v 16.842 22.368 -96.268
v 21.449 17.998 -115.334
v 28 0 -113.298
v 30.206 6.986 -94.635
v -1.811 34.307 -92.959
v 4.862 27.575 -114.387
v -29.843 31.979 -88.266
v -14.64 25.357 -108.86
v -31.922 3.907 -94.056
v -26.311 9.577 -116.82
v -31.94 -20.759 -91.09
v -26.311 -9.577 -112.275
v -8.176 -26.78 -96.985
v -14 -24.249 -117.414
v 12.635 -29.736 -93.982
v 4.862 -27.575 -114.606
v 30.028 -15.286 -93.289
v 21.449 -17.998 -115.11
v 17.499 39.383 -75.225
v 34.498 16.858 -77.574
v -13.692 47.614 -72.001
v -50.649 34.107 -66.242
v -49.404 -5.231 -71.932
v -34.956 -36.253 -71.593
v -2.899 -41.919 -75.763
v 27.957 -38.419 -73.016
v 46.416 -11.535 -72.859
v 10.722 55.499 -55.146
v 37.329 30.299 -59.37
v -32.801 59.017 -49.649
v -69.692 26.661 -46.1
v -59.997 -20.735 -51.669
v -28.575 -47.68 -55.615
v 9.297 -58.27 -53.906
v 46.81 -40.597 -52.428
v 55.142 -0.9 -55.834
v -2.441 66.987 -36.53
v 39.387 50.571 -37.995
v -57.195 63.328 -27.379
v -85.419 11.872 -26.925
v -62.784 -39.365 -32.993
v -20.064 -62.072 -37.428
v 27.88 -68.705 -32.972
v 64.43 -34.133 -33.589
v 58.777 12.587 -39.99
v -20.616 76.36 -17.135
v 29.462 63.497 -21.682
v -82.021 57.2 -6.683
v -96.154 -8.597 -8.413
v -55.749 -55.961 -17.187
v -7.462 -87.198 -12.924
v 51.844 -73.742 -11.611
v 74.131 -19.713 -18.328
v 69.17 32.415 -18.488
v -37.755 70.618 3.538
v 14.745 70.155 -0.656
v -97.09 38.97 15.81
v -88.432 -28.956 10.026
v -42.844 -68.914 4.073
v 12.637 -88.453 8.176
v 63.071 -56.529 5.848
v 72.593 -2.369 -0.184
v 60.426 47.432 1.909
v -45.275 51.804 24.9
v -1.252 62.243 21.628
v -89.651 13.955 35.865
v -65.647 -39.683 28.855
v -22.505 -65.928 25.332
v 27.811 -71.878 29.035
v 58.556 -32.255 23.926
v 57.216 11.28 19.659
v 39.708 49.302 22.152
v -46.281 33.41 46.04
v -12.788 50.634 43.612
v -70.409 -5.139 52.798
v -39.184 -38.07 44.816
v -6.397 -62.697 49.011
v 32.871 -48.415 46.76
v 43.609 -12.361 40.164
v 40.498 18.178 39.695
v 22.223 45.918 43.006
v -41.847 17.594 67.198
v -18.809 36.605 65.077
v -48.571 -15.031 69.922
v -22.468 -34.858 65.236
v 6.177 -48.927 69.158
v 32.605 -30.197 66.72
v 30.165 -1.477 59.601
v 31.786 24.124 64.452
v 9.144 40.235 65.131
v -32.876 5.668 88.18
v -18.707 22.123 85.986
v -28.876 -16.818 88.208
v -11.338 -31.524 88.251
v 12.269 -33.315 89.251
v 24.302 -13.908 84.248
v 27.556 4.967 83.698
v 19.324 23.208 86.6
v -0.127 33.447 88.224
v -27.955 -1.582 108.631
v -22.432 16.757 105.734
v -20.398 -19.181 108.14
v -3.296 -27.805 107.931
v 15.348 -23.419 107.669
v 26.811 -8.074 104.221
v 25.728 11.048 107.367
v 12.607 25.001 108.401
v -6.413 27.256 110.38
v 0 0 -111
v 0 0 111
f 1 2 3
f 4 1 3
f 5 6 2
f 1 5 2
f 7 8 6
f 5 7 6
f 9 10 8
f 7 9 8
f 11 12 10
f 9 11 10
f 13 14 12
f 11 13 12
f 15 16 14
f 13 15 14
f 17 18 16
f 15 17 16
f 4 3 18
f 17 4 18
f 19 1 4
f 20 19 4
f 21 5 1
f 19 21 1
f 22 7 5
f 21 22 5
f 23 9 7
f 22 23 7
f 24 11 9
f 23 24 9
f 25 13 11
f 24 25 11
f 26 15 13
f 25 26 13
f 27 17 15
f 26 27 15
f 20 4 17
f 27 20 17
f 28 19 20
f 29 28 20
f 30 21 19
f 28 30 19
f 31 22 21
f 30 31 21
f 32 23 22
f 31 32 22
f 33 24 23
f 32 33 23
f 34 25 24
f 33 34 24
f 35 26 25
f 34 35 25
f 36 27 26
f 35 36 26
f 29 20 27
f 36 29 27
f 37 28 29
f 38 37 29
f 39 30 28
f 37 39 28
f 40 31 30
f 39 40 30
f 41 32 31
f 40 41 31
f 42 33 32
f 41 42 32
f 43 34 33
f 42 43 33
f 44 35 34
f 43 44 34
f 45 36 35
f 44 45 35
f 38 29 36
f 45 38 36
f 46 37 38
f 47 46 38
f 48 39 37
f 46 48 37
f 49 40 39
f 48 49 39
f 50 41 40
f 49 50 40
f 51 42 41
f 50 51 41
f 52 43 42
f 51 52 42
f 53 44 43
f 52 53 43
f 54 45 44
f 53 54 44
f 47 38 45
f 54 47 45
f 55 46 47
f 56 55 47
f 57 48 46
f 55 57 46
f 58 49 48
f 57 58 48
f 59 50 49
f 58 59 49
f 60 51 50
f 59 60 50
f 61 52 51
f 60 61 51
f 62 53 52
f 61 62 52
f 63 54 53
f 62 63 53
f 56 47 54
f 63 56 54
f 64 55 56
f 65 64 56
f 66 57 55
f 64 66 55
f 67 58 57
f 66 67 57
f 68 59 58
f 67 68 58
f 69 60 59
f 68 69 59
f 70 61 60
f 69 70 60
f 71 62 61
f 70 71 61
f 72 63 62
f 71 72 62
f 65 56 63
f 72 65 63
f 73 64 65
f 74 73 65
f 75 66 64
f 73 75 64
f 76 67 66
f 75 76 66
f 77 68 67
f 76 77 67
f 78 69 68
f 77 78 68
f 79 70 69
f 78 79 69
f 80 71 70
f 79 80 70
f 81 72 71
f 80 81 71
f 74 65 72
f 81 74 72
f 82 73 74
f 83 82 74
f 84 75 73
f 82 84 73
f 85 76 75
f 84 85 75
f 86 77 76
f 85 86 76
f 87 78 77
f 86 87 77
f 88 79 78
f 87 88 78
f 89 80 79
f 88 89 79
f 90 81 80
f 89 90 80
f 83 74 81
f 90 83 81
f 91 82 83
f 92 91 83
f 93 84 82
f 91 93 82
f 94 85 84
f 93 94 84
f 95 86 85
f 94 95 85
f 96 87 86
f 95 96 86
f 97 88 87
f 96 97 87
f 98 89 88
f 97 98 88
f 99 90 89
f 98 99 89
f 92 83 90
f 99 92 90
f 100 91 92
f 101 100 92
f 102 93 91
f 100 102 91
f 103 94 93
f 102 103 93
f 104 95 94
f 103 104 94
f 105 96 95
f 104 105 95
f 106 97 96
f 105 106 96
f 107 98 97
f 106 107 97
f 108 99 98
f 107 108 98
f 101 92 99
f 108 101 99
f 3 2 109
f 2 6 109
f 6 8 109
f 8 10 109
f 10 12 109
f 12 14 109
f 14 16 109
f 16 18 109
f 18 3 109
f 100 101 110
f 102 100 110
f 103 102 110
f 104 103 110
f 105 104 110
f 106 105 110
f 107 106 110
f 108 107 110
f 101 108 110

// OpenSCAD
module object1(scale) {polyhedron(
 points=[[28,0,-113.29807126778162],[21.449244407331385,17.998053071223097,-115.33448118412322],[16.842323638503295,22.368194707126307,-96.26775887044725],
[28,0,-113.29807126778162],[16.842323638503295,22.368194707126307,-96.26775887044725],[30.205709612306514,6.985626156597965,-94.63488091709826],
[21.449244407331385,17.998053071223097,-115.33448118412322],[4.862148974674051,27.574617084341824,-114.38710898759963],[-1.8110481182452045,34.307460404387896,-92.95874931797498],
[21.449244407331385,17.998053071223097,-115.33448118412322],[-1.8110481182452045,34.307460404387896,-92.95874931797498],[16.842323638503295,22.368194707126307,-96.26775887044725],
[4.862148974674051,27.574617084341824,-114.38710898759963],[-14.63976195944456,25.356811524472093,-108.86023804055543],[-29.843335256421017,31.97869198412332,-88.2659418283453],
[4.862148974674051,27.574617084341824,-114.38710898759963],[-29.843335256421017,31.97869198412332,-88.2659418283453],[-1.8110481182452045,34.307460404387896,-92.95874931797498],
[-14.63976195944456,25.356811524472093,-108.86023804055543],[-26.311393382005434,9.576564013118729,-116.82011558374396],[-31.92175213137996,3.907188196070144,-94.05637313001716],
[-14.63976195944456,25.356811524472093,-108.86023804055543],[-31.92175213137996,3.907188196070144,-94.05637313001716],[-29.843335256421017,31.97869198412332,-88.2659418283453],
[-26.311393382005434,9.576564013118729,-116.82011558374396],[-26.311393382005434,-9.576564013118723,-112.2748494113802],[-31.93951699779394,-20.759021255166886,-91.08990917939948],
[-26.311393382005434,9.576564013118729,-116.82011558374396],[-31.93951699779394,-20.759021255166886,-91.08990917939948],[-31.92175213137996,3.907188196070144,-94.05637313001716],
[-26.311393382005434,-9.576564013118723,-112.2748494113802],[-14.000000000000012,-24.248711305964274,-117.41365111449593],[-8.176234080321816,-26.779641451367194,-96.98470474322335],
[-26.311393382005434,-9.576564013118723,-112.2748494113802],[-8.176234080321816,-26.779641451367194,-96.98470474322335],[-31.93951699779394,-20.759021255166886,-91.08990917939948],
[-14.000000000000012,-24.248711305964274,-117.41365111449593],[4.862148974674039,-27.574617084341828,-114.60568491477093],[12.635435192538141,-29.735804463732677,-93.98185737951555],
[-14.000000000000012,-24.248711305964274,-117.41365111449593],[12.635435192538141,-29.735804463732677,-93.98185737951555],[-8.176234080321816,-26.779641451367194,-96.98470474322335],
[4.862148974674039,-27.574617084341828,-114.60568491477093],[21.449244407331378,-17.998053071223108,-115.10959001370429],[30.027776818176164,-15.285549196324304,-93.28914283532757],
[4.862148974674039,-27.574617084341828,-114.60568491477093],[30.027776818176164,-15.285549196324304,-93.28914283532757],[12.635435192538141,-29.735804463732677,-93.98185737951555],
[21.449244407331378,-17.998053071223108,-115.10959001370429],[28,0,-113.29807126778162],[30.205709612306514,6.985626156597965,-94.63488091709826],
[21.449244407331378,-17.998053071223108,-115.10959001370429],[30.205709612306514,6.985626156597965,-94.63488091709826],[30.027776818176164,-15.285549196324304,-93.28914283532757],
[30.205709612306514,6.985626156597965,-94.63488091709826],[16.842323638503295,22.368194707126307,-96.26775887044725],[17.49853483256472,39.38286169945253,-75.2250561867103],
[30.205709612306514,6.985626156597965,-94.63488091709826],[17.49853483256472,39.38286169945253,-75.2250561867103],[34.49782843915703,16.85817600499015,-77.57443135074021],
[16.842323638503295,22.368194707126307,-96.26775887044725],[-1.8110481182452045,34.307460404387896,-92.95874931797498],[-13.692161381876396,47.61366551315927,-72.00108811165055],
[16.842323638503295,22.368194707126307,-96.26775887044725],[-13.692161381876396,47.61366551315927,-72.00108811165055],[17.49853483256472,39.38286169945253,-75.2250561867103],
[-1.8110481182452045,34.307460404387896,-92.95874931797498],[-29.843335256421017,31.97869198412332,-88.2659418283453],[-50.648792736040654,34.107075904793966,-66.24162496543339],
[-1.8110481182452045,34.307460404387896,-92.95874931797498],[-50.648792736040654,34.107075904793966,-66.24162496543339],[-13.692161381876396,47.61366551315927,-72.00108811165055],
[-29.843335256421017,31.97869198412332,-88.2659418283453],[-31.92175213137996,3.907188196070144,-94.05637313001716],[-49.40443342320193,-5.230572842721768,-71.9324528472574],
[-29.843335256421017,31.97869198412332,-88.2659418283453],[-49.40443342320193,-5.230572842721768,-71.9324528472574],[-50.648792736040654,34.107075904793966,-66.24162496543339],
[-31.92175213137996,3.907188196070144,-94.05637313001716],[-31.93951699779394,-20.759021255166886,-91.08990917939948],[-34.95576185722093,-36.252837582695264,-71.59250924440181],
[-31.92175213137996,3.907188196070144,-94.05637313001716],[-34.95576185722093,-36.252837582695264,-71.59250924440181],[-49.40443342320193,-5.230572842721768,-71.9324528472574],
[-31.93951699779394,-20.759021255166886,-91.08990917939948],[-8.176234080321816,-26.779641451367194,-96.98470474322335],[-2.899271068370793,-41.91921983584189,-75.76304638287596],
[-31.93951699779394,-20.759021255166886,-91.08990917939948],[-2.899271068370793,-41.91921983584189,-75.76304638287596],[-34.95576185722093,-36.252837582695264,-71.59250924440181],
[-8.176234080321816,-26.779641451367194,-96.98470474322335],[12.635435192538141,-29.735804463732677,-93.98185737951555],[27.957493955642914,-38.41876575922486,-73.01550189421347],
[-8.176234080321816,-26.779641451367194,-96.98470474322335],[27.957493955642914,-38.41876575922486,-73.01550189421347],[-2.899271068370793,-41.91921983584189,-75.76304638287596],
[12.635435192538141,-29.735804463732677,-93.98185737951555],[30.027776818176164,-15.285549196324304,-93.28914283532757],[46.416468117173125,-11.53547036556529,-72.85852861885542],
[12.635435192538141,-29.735804463732677,-93.98185737951555],[46.416468117173125,-11.53547036556529,-72.85852861885542],[27.957493955642914,-38.41876575922486,-73.01550189421347],
[30.027776818176164,-15.285549196324304,-93.28914283532757],[30.205709612306514,6.985626156597965,-94.63488091709826],[34.49782843915703,16.85817600499015,-77.57443135074021],
[30.027776818176164,-15.285549196324304,-93.28914283532757],[34.49782843915703,16.85817600499015,-77.57443135074021],[46.416468117173125,-11.53547036556529,-72.85852861885542],
[34.49782843915703,16.85817600499015,-77.57443135074021],[17.49853483256472,39.38286169945253,-75.2250561867103],[10.722265180623465,55.49891842691174,-55.14649673781652],
[34.49782843915703,16.85817600499015,-77.57443135074021],[10.722265180623465,55.49891842691174,-55.14649673781652],[37.328617428965615,30.2986293146558,-59.37041052983031],
[17.49853483256472,39.38286169945253,-75.2250561867103],[-13.692161381876396,47.61366551315927,-72.00108811165055],[-32.80149414834799,59.01672500603995,-49.64923364931177],
[17.49853483256472,39.38286169945253,-75.2250561867103],[-32.80149414834799,59.01672500603995,-49.64923364931177],[10.722265180623465,55.49891842691174,-55.14649673781652],
[-13.692161381876396,47.61366551315927,-72.00108811165055],[-50.648792736040654,34.107075904793966,-66.24162496543339],[-69.69241515290658,26.66131327541818,-46.10004925892564],
[-13.692161381876396,47.61366551315927,-72.00108811165055],[-69.69241515290658,26.66131327541818,-46.10004925892564],[-32.80149414834799,59.01672500603995,-49.64923364931177],
[-50.648792736040654,34.107075904793966,-66.24162496543339],[-49.40443342320193,-5.230572842721768,-71.9324528472574],[-59.997386768556936,-20.735278130707076,-51.66937533769051],
[-50.648792736040654,34.107075904793966,-66.24162496543339],[-59.997386768556936,-20.735278130707076,-51.66937533769051],[-69.69241515290658,26.66131327541818,-46.10004925892564],
[-49.40443342320193,-5.230572842721768,-71.9324528472574],[-34.95576185722093,-36.252837582695264,-71.59250924440181],[-28.575369504268686,-47.680415732384056,-55.61532458137606],
[-49.40443342320193,-5.230572842721768,-71.9324528472574],[-28.575369504268686,-47.680415732384056,-55.61532458137606],[-59.997386768556936,-20.735278130707076,-51.66937533769051],
[-34.95576185722093,-36.252837582695264,-71.59250924440181],[-2.899271068370793,-41.91921983584189,-75.76304638287596],[9.297098061115237,-58.26964742228937,-53.905752779838885],
[-34.95576185722093,-36.252837582695264,-71.59250924440181],[9.297098061115237,-58.26964742228937,-53.905752779838885],[-28.575369504268686,-47.680415732384056,-55.61532458137606],
[-2.899271068370793,-41.91921983584189,-75.76304638287596],[27.957493955642914,-38.41876575922486,-73.01550189421347],[46.809529108148176,-40.59732712723013,-52.42814924650621],
[-2.899271068370793,-41.91921983584189,-75.76304638287596],[46.809529108148176,-40.59732712723013,-52.42814924650621],[9.297098061115237,-58.26964742228937,-53.905752779838885],
[27.957493955642914,-38.41876575922486,-73.01550189421347],[46.416468117173125,-11.53547036556529,-72.85852861885542],[55.14202416761634,-0.899640266603615,-55.834409669268396],
[27.957493955642914,-38.41876575922486,-73.01550189421347],[55.14202416761634,-0.899640266603615,-55.834409669268396],[46.809529108148176,-40.59732712723013,-52.42814924650621],
[46.416468117173125,-11.53547036556529,-72.85852861885542],[34.49782843915703,16.85817600499015,-77.57443135074021],[37.328617428965615,30.2986293146558,-59.37041052983031],
[46.416468117173125,-11.53547036556529,-72.85852861885542],[37.328617428965615,30.2986293146558,-59.37041052983031],[55.14202416761634,-0.899640266603615,-55.834409669268396],
[37.328617428965615,30.2986293146558,-59.37041052983031],[10.722265180623465,55.49891842691174,-55.14649673781652],[-2.4411631845606916,66.98688903720753,-36.52977694311145],
[37.328617428965615,30.2986293146558,-59.37041052983031],[-2.4411631845606916,66.98688903720753,-36.52977694311145],[39.38704892815642,50.57134781897295,-37.99549025726645],
[10.722265180623465,55.49891842691174,-55.14649673781652],[-32.80149414834799,59.01672500603995,-49.64923364931177],[-57.194884879372786,63.327551858524004,-27.379210040111815],
[10.722265180623465,55.49891842691174,-55.14649673781652],[-57.194884879372786,63.327551858524004,-27.379210040111815],[-2.4411631845606916,66.98688903720753,-36.52977694311145],
[-32.80149414834799,59.01672500603995,-49.64923364931177],[-69.69241515290658,26.66131327541818,-46.10004925892564],[-85.41891859967505,11.8724993290819,-26.925424701259846],
[-32.80149414834799,59.01672500603995,-49.64923364931177],[-85.41891859967505,11.8724993290819,-26.925424701259846],[-57.194884879372786,63.327551858524004,-27.379210040111815],
[-69.69241515290658,26.66131327541818,-46.10004925892564],[-59.997386768556936,-20.735278130707076,-51.66937533769051],[-62.78422739327124,-39.364733904516726,-32.99332409137875],
[-69.69241515290658,26.66131327541818,-46.10004925892564],[-62.78422739327124,-39.364733904516726,-32.99332409137875],[-85.41891859967505,11.8724993290819,-26.925424701259846],
[-59.997386768556936,-20.735278130707076,-51.66937533769051],[-28.575369504268686,-47.680415732384056,-55.61532458137606],[-20.064125666834286,-62.07184019997098,-37.42842492676742],
[-59.997386768556936,-20.735278130707076,-51.66937533769051],[-20.064125666834286,-62.07184019997098,-37.42842492676742],[-62.78422739327124,-39.364733904516726,-32.99332409137875],
[-28.575369504268686,-47.680415732384056,-55.61532458137606],[9.297098061115237,-58.26964742228937,-53.905752779838885],[27.880269780311366,-68.70529234598938,-32.97212639916178],
[-28.575369504268686,-47.680415732384056,-55.61532458137606],[27.880269780311366,-68.70529234598938,-32.97212639916178],[-20.064125666834286,-62.07184019997098,-37.42842492676742],
[9.297098061115237,-58.26964742228937,-53.905752779838885],[46.809529108148176,-40.59732712723013,-52.42814924650621],[64.43029872698719,-34.13270230842185,-33.58895731613974],
[9.297098061115237,-58.26964742228937,-53.905752779838885],[64.43029872698719,-34.13270230842185,-33.58895731613974],[27.880269780311366,-68.70529234598938,-32.97212639916178],
[46.809529108148176,-40.59732712723013,-52.42814924650621],[55.14202416761634,-0.899640266603615,-55.834409669268396],[58.77737700555178,12.586906942873243,-39.9904621396939],
[46.809529108148176,-40.59732712723013,-52.42814924650621],[58.77737700555178,12.586906942873243,-39.9904621396939],[64.43029872698719,-34.13270230842185,-33.58895731613974],
[55.14202416761634,-0.899640266603615,-55.834409669268396],[37.328617428965615,30.2986293146558,-59.37041052983031],[39.38704892815642,50.57134781897295,-37.99549025726645],
[55.14202416761634,-0.899640266603615,-55.834409669268396],[39.38704892815642,50.57134781897295,-37.99549025726645],[58.77737700555178,12.586906942873243,-39.9904621396939],
[39.38704892815642,50.57134781897295,-37.99549025726645],[-2.4411631845606916,66.98688903720753,-36.52977694311145],[-20.616242435047283,76.36034470845601,-17.134594208020502],
[39.38704892815642,50.57134781897295,-37.99549025726645],[-20.616242435047283,76.36034470845601,-17.134594208020502],[29.462319732758896,63.49678649868339,-21.682281828836672],
[-2.4411631845606916,66.98688903720753,-36.52977694311145],[-57.194884879372786,63.327551858524004,-27.379210040111815],[-82.02131338174439,57.20004860390573,-6.683464686039194],
[-2.4411631845606916,66.98688903720753,-36.52977694311145],[-82.02131338174439,57.20004860390573,-6.683464686039194],[-20.616242435047283,76.36034470845601,-17.134594208020502],
[-57.194884879372786,63.327551858524004,-27.379210040111815],[-85.41891859967505,11.8724993290819,-26.925424701259846],[-96.15437974735579,-8.596504127186654,-8.412872088580755],
[-57.194884879372786,63.327551858524004,-27.379210040111815],[-96.15437974735579,-8.596504127186654,-8.412872088580755],[-82.02131338174439,57.20004860390573,-6.683464686039194],
[-85.41891859967505,11.8724993290819,-26.925424701259846],[-62.78422739327124,-39.364733904516726,-32.99332409137875],[-55.74858440426597,-55.96079030870521,-17.18651873031876],
[-85.41891859967505,11.8724993290819,-26.925424701259846],[-55.74858440426597,-55.96079030870521,-17.18651873031876],[-96.15437974735579,-8.596504127186654,-8.412872088580755],
[-62.78422739327124,-39.364733904516726,-32.99332409137875],[-20.064125666834286,-62.07184019997098,-37.42842492676742],[-7.461930527035907,-87.19773913819604,-12.923601473401018],
[-62.78422739327124,-39.364733904516726,-32.99332409137875],[-7.461930527035907,-87.19773913819604,-12.923601473401018],[-55.74858440426597,-55.96079030870521,-17.18651873031876],
[-20.064125666834286,-62.07184019997098,-37.42842492676742],[27.880269780311366,-68.70529234598938,-32.97212639916178],[51.843722509476876,-73.74196740560724,-11.610626383482956],
[-20.064125666834286,-62.07184019997098,-37.42842492676742],[51.843722509476876,-73.74196740560724,-11.610626383482956],[-7.461930527035907,-87.19773913819604,-12.923601473401018],
[27.880269780311366,-68.70529234598938,-32.97212639916178],[64.43029872698719,-34.13270230842185,-33.58895731613974],[74.13106994552773,-19.71250537986982,-18.328205576158332],
[27.880269780311366,-68.70529234598938,-32.97212639916178],[74.13106994552773,-19.71250537986982,-18.328205576158332],[51.843722509476876,-73.74196740560724,-11.610626383482956],
[64.43029872698719,-34.13270230842185,-33.58895731613974],[58.77737700555178,12.586906942873243,-39.9904621396939],[69.17008151697299,32.41464914037079,-18.487546176849854],
[64.43029872698719,-34.13270230842185,-33.58895731613974],[69.17008151697299,32.41464914037079,-18.487546176849854],[74.13106994552773,-19.71250537986982,-18.328205576158332],
[58.77737700555178,12.586906942873243,-39.9904621396939],[39.38704892815642,50.57134781897295,-37.99549025726645],[29.462319732758896,63.49678649868339,-21.682281828836672],
[58.77737700555178,12.586906942873243,-39.9904621396939],[29.462319732758896,63.49678649868339,-21.682281828836672],[69.17008151697299,32.41464914037079,-18.487546176849854],
[29.462319732758896,63.49678649868339,-21.682281828836672],[-20.616242435047283,76.36034470845601,-17.134594208020502],[-37.754919174458486,70.61785770015408,3.538468215046329],
[29.462319732758896,63.49678649868339,-21.682281828836672],[-37.754919174458486,70.61785770015408,3.538468215046329],[14.744757671837336,70.15461155905867,-0.6563206345818475],
[-20.616242435047283,76.36034470845601,-17.134594208020502],[-82.02131338174439,57.20004860390573,-6.683464686039194],[-97.09048224227504,38.96988719242745,15.80968803631896],
[-20.616242435047283,76.36034470845601,-17.134594208020502],[-97.09048224227504,38.96988719242745,15.80968803631896],[-37.754919174458486,70.61785770015408,3.538468215046329],
[-82.02131338174439,57.20004860390573,-6.683464686039194],[-96.15437974735579,-8.596504127186654,-8.412872088580755],[-88.43199254586949,-28.956328508501308,10.02603106413914],
[-82.02131338174439,57.20004860390573,-6.683464686039194],[-88.43199254586949,-28.956328508501308,10.02603106413914],[-97.09048224227504,38.96988719242745,15.80968803631896],
[-96.15437974735579,-8.596504127186654,-8.412872088580755],[-55.74858440426597,-55.96079030870521,-17.18651873031876],[-42.843991073497385,-68.91378387191591,4.073135134750984],
[-96.15437974735579,-8.596504127186654,-8.412872088580755],[-42.843991073497385,-68.91378387191591,4.073135134750984],[-88.43199254586949,-28.956328508501308,10.02603106413914],
[-55.74858440426597,-55.96079030870521,-17.18651873031876],[-7.461930527035907,-87.19773913819604,-12.923601473401018],[12.636921527374698,-88.45287017015035,8.17550231118419],
[-55.74858440426597,-55.96079030870521,-17.18651873031876],[12.636921527374698,-88.45287017015035,8.17550231118419],[-42.843991073497385,-68.91378387191591,4.073135134750984],
[-7.461930527035907,-87.19773913819604,-12.923601473401018],[51.843722509476876,-73.74196740560724,-11.610626383482956],[63.07078101337039,-56.52938571443852,5.848243372329762],
[-7.461930527035907,-87.19773913819604,-12.923601473401018],[63.07078101337039,-56.52938571443852,5.848243372329762],[12.636921527374698,-88.45287017015035,8.17550231118419],
[51.843722509476876,-73.74196740560724,-11.610626383482956],[74.13106994552773,-19.71250537986982,-18.328205576158332],[72.59290938062695,-2.36933240635393,-0.18421752049216344],
[51.843722509476876,-73.74196740560724,-11.610626383482956],[72.59290938062695,-2.36933240635393,-0.18421752049216344],[63.07078101337039,-56.52938571443852,5.848243372329762],
[74.13106994552773,-19.71250537986982,-18.328205576158332],[69.17008151697299,32.41464914037079,-18.487546176849854],[60.425993289575395,47.43217994510562,1.909348990111404],
[74.13106994552773,-19.71250537986982,-18.328205576158332],[60.425993289575395,47.43217994510562,1.909348990111404],[72.59290938062695,-2.36933240635393,-0.18421752049216344],
[69.17008151697299,32.41464914037079,-18.487546176849854],[29.462319732758896,63.49678649868339,-21.682281828836672],[14.744757671837336,70.15461155905867,-0.6563206345818475],
[69.17008151697299,32.41464914037079,-18.487546176849854],[14.744757671837336,70.15461155905867,-0.6563206345818475],[60.425993289575395,47.43217994510562,1.909348990111404],
[14.744757671837336,70.15461155905867,-0.6563206345818475],[-37.754919174458486,70.61785770015408,3.538468215046329],[-45.27525037036575,51.80432006371692,24.900348375282952],
[14.744757671837336,70.15461155905867,-0.6563206345818475],[-45.27525037036575,51.80432006371692,24.900348375282952],[-1.2520378554008849,62.24251513052042,21.627553263003268],
[-37.754919174458486,70.61785770015408,3.538468215046329],[-97.09048224227504,38.96988719242745,15.80968803631896],[-89.65114795447415,13.95504350752062,35.865382090454744],
[-37.754919174458486,70.61785770015408,3.538468215046329],[-89.65114795447415,13.95504350752062,35.865382090454744],[-45.27525037036575,51.80432006371692,24.900348375282952],
[-97.09048224227504,38.96988719242745,15.80968803631896],[-88.43199254586949,-28.956328508501308,10.02603106413914],[-65.64728934366377,-39.68287068111601,28.854585200680013],
[-97.09048224227504,38.96988719242745,15.80968803631896],[-65.64728934366377,-39.68287068111601,28.854585200680013],[-89.65114795447415,13.95504350752062,35.865382090454744],
[-88.43199254586949,-28.956328508501308,10.02603106413914],[-42.843991073497385,-68.91378387191591,4.073135134750984],[-22.505026835614245,-65.92840556604477,25.331849266700594],
[-88.43199254586949,-28.956328508501308,10.02603106413914],[-22.505026835614245,-65.92840556604477,25.331849266700594],[-65.64728934366377,-39.68287068111601,28.854585200680013],
[-42.843991073497385,-68.91378387191591,4.073135134750984],[12.636921527374698,-88.45287017015035,8.17550231118419],[27.811012461758473,-71.87821668396224,29.035472125739926],
[-42.843991073497385,-68.91378387191591,4.073135134750984],[27.811012461758473,-71.87821668396224,29.035472125739926],[-22.505026835614245,-65.92840556604477,25.331849266700594],
[12.636921527374698,-88.45287017015035,8.17550231118419],[63.07078101337039,-56.52938571443852,5.848243372329762],[58.55552632960674,-32.254582307831164,23.925692751197865],
[12.636921527374698,-88.45287017015035,8.17550231118419],[58.55552632960674,-32.254582307831164,23.925692751197865],[27.811012461758473,-71.87821668396224,29.035472125739926],
[63.07078101337039,-56.52938571443852,5.848243372329762],[72.59290938062695,-2.36933240635393,-0.18421752049216344],[57.215859214900114,11.27963171991445,19.658552079262147],
[63.07078101337039,-56.52938571443852,5.848243372329762],[57.215859214900114,11.27963171991445,19.658552079262147],[58.55552632960674,-32.254582307831164,23.925692751197865],
[72.59290938062695,-2.36933240635393,-0.18421752049216344],[60.425993289575395,47.43217994510562,1.909348990111404],[39.70752368126048,49.30222683610827,22.152002337517835],
[72.59290938062695,-2.36933240635393,-0.18421752049216344],[39.70752368126048,49.30222683610827,22.152002337517835],[57.215859214900114,11.27963171991445,19.658552079262147],
[60.425993289575395,47.43217994510562,1.909348990111404],[14.744757671837336,70.15461155905867,-0.6563206345818475],[-1.2520378554008849,62.24251513052042,21.627553263003268],
[60.425993289575395,47.43217994510562,1.909348990111404],[-1.2520378554008849,62.24251513052042,21.627553263003268],[39.70752368126048,49.30222683610827,22.152002337517835],
[-1.2520378554008849,62.24251513052042,21.627553263003268],[-45.27525037036575,51.80432006371692,24.900348375282952],[-46.28057757186076,33.41036370551563,46.040078237979046],
[-1.2520378554008849,62.24251513052042,21.627553263003268],[-46.28057757186076,33.41036370551563,46.040078237979046],[-12.788172365010224,50.634435959087476,43.61217846777699],
[-45.27525037036575,51.80432006371692,24.900348375282952],[-89.65114795447415,13.95504350752062,35.865382090454744],[-70.4093376092204,-5.138595171850747,52.79830018184073],
[-45.27525037036575,51.80432006371692,24.900348375282952],[-70.4093376092204,-5.138595171850747,52.79830018184073],[-46.28057757186076,33.41036370551563,46.040078237979046],
[-89.65114795447415,13.95504350752062,35.865382090454744],[-65.64728934366377,-39.68287068111601,28.854585200680013],[-39.184007067946006,-38.07039302491386,44.81639267441922],
[-89.65114795447415,13.95504350752062,35.865382090454744],[-39.184007067946006,-38.07039302491386,44.81639267441922],[-70.4093376092204,-5.138595171850747,52.79830018184073],
[-65.64728934366377,-39.68287068111601,28.854585200680013],[-22.505026835614245,-65.92840556604477,25.331849266700594],[-6.397124998464627,-62.69709752843563,49.01130450622504],
[-65.64728934366377,-39.68287068111601,28.854585200680013],[-6.397124998464627,-62.69709752843563,49.01130450622504],[-39.184007067946006,-38.07039302491386,44.81639267441922],
[-22.505026835614245,-65.92840556604477,25.331849266700594],[27.811012461758473,-71.87821668396224,29.035472125739926],[32.87077550156242,-48.41485876408088,46.75955583745257],
[-22.505026835614245,-65.92840556604477,25.331849266700594],[32.87077550156242,-48.41485876408088,46.75955583745257],[-6.397124998464627,-62.69709752843563,49.01130450622504],
[27.811012461758473,-71.87821668396224,29.035472125739926],[58.55552632960674,-32.254582307831164,23.925692751197865],[43.6094672124962,-12.361493165483521,40.163804534091796],
[27.811012461758473,-71.87821668396224,29.035472125739926],[43.6094672124962,-12.361493165483521,40.163804534091796],[32.87077550156242,-48.41485876408088,46.75955583745257],
[58.55552632960674,-32.254582307831164,23.925692751197865],[57.215859214900114,11.27963171991445,19.658552079262147],[40.49754597244616,18.178357121462668,39.69517907917069],
[58.55552632960674,-32.254582307831164,23.925692751197865],[40.49754597244616,18.178357121462668,39.69517907917069],[43.6094672124962,-12.361493165483521,40.163804534091796],
[57.215859214900114,11.27963171991445,19.658552079262147],[39.70752368126048,49.30222683610827,22.152002337517835],[22.223162179147504,45.91792694998919,43.006494038897415],
[57.215859214900114,11.27963171991445,19.658552079262147],[22.223162179147504,45.91792694998919,43.006494038897415],[40.49754597244616,18.178357121462668,39.69517907917069],
[39.70752368126048,49.30222683610827,22.152002337517835],[-1.2520378554008849,62.24251513052042,21.627553263003268],[-12.788172365010224,50.634435959087476,43.61217846777699],
[39.70752368126048,49.30222683610827,22.152002337517835],[-12.788172365010224,50.634435959087476,43.61217846777699],[22.223162179147504,45.91792694998919,43.006494038897415],
[-12.788172365010224,50.634435959087476,43.61217846777699],[-46.28057757186076,33.41036370551563,46.040078237979046],[-41.847045665450175,17.594391122547847,67.19767515572612],
[-12.788172365010224,50.634435959087476,43.61217846777699],[-41.847045665450175,17.594391122547847,67.19767515572612],[-18.80906723286571,36.604909482619554,65.07729579172903],
[-46.28057757186076,33.41036370551563,46.040078237979046],[-70.4093376092204,-5.138595171850747,52.79830018184073],[-48.570593681550164,-15.031313449322514,69.92165884924717],
[-46.28057757186076,33.41036370551563,46.040078237979046],[-48.570593681550164,-15.031313449322514,69.92165884924717],[-41.847045665450175,17.594391122547847,67.19767515572612],
[-70.4093376092204,-5.138595171850747,52.79830018184073],[-39.184007067946006,-38.07039302491386,44.81639267441922],[-22.467744233094308,-34.85765332037445,65.23557044023119],
[-70.4093376092204,-5.138595171850747,52.79830018184073],[-22.467744233094308,-34.85765332037445,65.23557044023119],[-48.570593681550164,-15.031313449322514,69.92165884924717],
[-39.184007067946006,-38.07039302491386,44.81639267441922],[-6.397124998464627,-62.69709752843563,49.01130450622504],[6.17738304149106,-48.927091573315344,69.15775917974345],
[-39.184007067946006,-38.07039302491386,44.81639267441922],[6.17738304149106,-48.927091573315344,69.15775917974345],[-22.467744233094308,-34.85765332037445,65.23557044023119],
[-6.397124998464627,-62.69709752843563,49.01130450622504],[32.87077550156242,-48.41485876408088,46.75955583745257],[32.604948683835055,-30.196834285866608,66.72010058237592],
[-6.397124998464627,-62.69709752843563,49.01130450622504],[32.604948683835055,-30.196834285866608,66.72010058237592],[6.17738304149106,-48.927091573315344,69.15775917974345],
[32.87077550156242,-48.41485876408088,46.75955583745257],[43.6094672124962,-12.361493165483521,40.163804534091796],[30.165242407630007,-1.4774835641191089,59.60070202998294],
[32.87077550156242,-48.41485876408088,46.75955583745257],[30.165242407630007,-1.4774835641191089,59.60070202998294],[32.604948683835055,-30.196834285866608,66.72010058237592],
[43.6094672124962,-12.361493165483521,40.163804534091796],[40.49754597244616,18.178357121462668,39.69517907917069],[31.786297078982788,24.123538853716468,64.45190347322857],
[43.6094672124962,-12.361493165483521,40.163804534091796],[31.786297078982788,24.123538853716468,64.45190347322857],[30.165242407630007,-1.4774835641191089,59.60070202998294],
[40.49754597244616,18.178357121462668,39.69517907917069],[22.223162179147504,45.91792694998919,43.006494038897415],[9.144248865687759,40.23527570324277,65.13064891268324],
[40.49754597244616,18.178357121462668,39.69517907917069],[9.144248865687759,40.23527570324277,65.13064891268324],[31.786297078982788,24.123538853716468,64.45190347322857],
[22.223162179147504,45.91792694998919,43.006494038897415],[-12.788172365010224,50.634435959087476,43.61217846777699],[-18.80906723286571,36.604909482619554,65.07729579172903],
[22.223162179147504,45.91792694998919,43.006494038897415],[-18.80906723286571,36.604909482619554,65.07729579172903],[9.144248865687759,40.23527570324277,65.13064891268324],
[-18.80906723286571,36.604909482619554,65.07729579172903],[-41.847045665450175,17.594391122547847,67.19767515572612],[-32.875922966354814,5.668210737259227,88.18048953007433],
[-18.80906723286571,36.604909482619554,65.07729579172903],[-32.875922966354814,5.668210737259227,88.18048953007433],[-18.706770514744793,22.122622521332158,85.98580072271358],
[-41.847045665450175,17.594391122547847,67.19767515572612],[-48.570593681550164,-15.031313449322514,69.92165884924717],[-28.876088446202626,-16.81821615787931,88.20838770412985],
[-41.847045665450175,17.594391122547847,67.19767515572612],[-28.876088446202626,-16.81821615787931,88.20838770412985],[-32.875922966354814,5.668210737259227,88.18048953007433],
[-48.570593681550164,-15.031313449322514,69.92165884924717],[-22.467744233094308,-34.85765332037445,65.23557044023119],[-11.338390086907213,-31.524109227837247,88.25058620146984],
[-48.570593681550164,-15.031313449322514,69.92165884924717],[-11.338390086907213,-31.524109227837247,88.25058620146984],[-28.876088446202626,-16.81821615787931,88.20838770412985],
[-22.467744233094308,-34.85765332037445,65.23557044023119],[6.17738304149106,-48.927091573315344,69.15775917974345],[12.269285876268777,-33.315214433020955,89.25133015179267],
[-22.467744233094308,-34.85765332037445,65.23557044023119],[12.269285876268777,-33.315214433020955,89.25133015179267],[-11.338390086907213,-31.524109227837247,88.25058620146984],
[6.17738304149106,-48.927091573315344,69.15775917974345],[32.604948683835055,-30.196834285866608,66.72010058237592],[24.301725603956132,-13.90777238345606,84.24760356727748],
[6.17738304149106,-48.927091573315344,69.15775917974345],[24.301725603956132,-13.90777238345606,84.24760356727748],[12.269285876268777,-33.315214433020955,89.25133015179267],
[32.604948683835055,-30.196834285866608,66.72010058237592],[30.165242407630007,-1.4774835641191089,59.60070202998294],[27.555945623538975,4.966876361715012,83.69793753832789],
[32.604948683835055,-30.196834285866608,66.72010058237592],[27.555945623538975,4.966876361715012,83.69793753832789],[24.301725603956132,-13.90777238345606,84.24760356727748],
[30.165242407630007,-1.4774835641191089,59.60070202998294],[31.786297078982788,24.123538853716468,64.45190347322857],[19.323814468920496,23.207721168200944,86.5997361520841],
[30.165242407630007,-1.4774835641191089,59.60070202998294],[19.323814468920496,23.207721168200944,86.5997361520841],[27.555945623538975,4.966876361715012,83.69793753832789],
[31.786297078982788,24.123538853716468,64.45190347322857],[9.144248865687759,40.23527570324277,65.13064891268324],[-0.1270756077013729,33.447432788100066,88.22383709204128],
[31.786297078982788,24.123538853716468,64.45190347322857],[-0.1270756077013729,33.447432788100066,88.22383709204128],[19.323814468920496,23.207721168200944,86.5997361520841],
[9.144248865687759,40.23527570324277,65.13064891268324],[-18.80906723286571,36.604909482619554,65.07729579172903],[-18.706770514744793,22.122622521332158,85.98580072271358],
[9.144248865687759,40.23527570324277,65.13064891268324],[-18.706770514744793,22.122622521332158,85.98580072271358],[-0.1270756077013729,33.447432788100066,88.22383709204128],
[-18.706770514744793,22.122622521332158,85.98580072271358],[-32.875922966354814,5.668210737259227,88.18048953007433],[-27.955258626471,-1.5822500204198602,108.63080446877782],
[-18.706770514744793,22.122622521332158,85.98580072271358],[-27.955258626471,-1.5822500204198602,108.63080446877782],[-22.432021235314142,16.757220034910784,105.73360932793074],
[-32.875922966354814,5.668210737259227,88.18048953007433],[-28.876088446202626,-16.81821615787931,88.20838770412985],[-20.39791981820982,-19.18136770644583,108.14049116006588],
[-32.875922966354814,5.668210737259227,88.18048953007433],[-20.39791981820982,-19.18136770644583,108.14049116006588],[-27.955258626471,-1.5822500204198602,108.63080446877782],
[-28.876088446202626,-16.81821615787931,88.20838770412985],[-11.338390086907213,-31.524109227837247,88.25058620146984],[-3.2961676293812414,-27.805310265469423,107.93107872202285],
[-28.876088446202626,-16.81821615787931,88.20838770412985],[-3.2961676293812414,-27.805310265469423,107.93107872202285],[-20.39791981820982,-19.18136770644583,108.14049116006588],
[-11.338390086907213,-31.524109227837247,88.25058620146984],[12.269285876268777,-33.315214433020955,89.25133015179267],[15.347898026057551,-23.41883912967803,107.66936242247387],
[-11.338390086907213,-31.524109227837247,88.25058620146984],[15.347898026057551,-23.41883912967803,107.66936242247387],[-3.2961676293812414,-27.805310265469423,107.93107872202285],
[12.269285876268777,-33.315214433020955,89.25133015179267],[24.301725603956132,-13.90777238345606,84.24760356727748],[26.810511622217447,-8.07443289370487,104.22144809056266],
[12.269285876268777,-33.315214433020955,89.25133015179267],[26.810511622217447,-8.07443289370487,104.22144809056266],[15.347898026057551,-23.41883912967803,107.66936242247387],
[24.301725603956132,-13.90777238345606,84.24760356727748],[27.555945623538975,4.966876361715012,83.69793753832789],[25.728188864695372,11.048090230558632,107.36670049954753],
[24.301725603956132,-13.90777238345606,84.24760356727748],[25.728188864695372,11.048090230558632,107.36670049954753],[26.810511622217447,-8.07443289370487,104.22144809056266],
[27.555945623538975,4.966876361715012,83.69793753832789],[19.323814468920496,23.207721168200944,86.5997361520841],[12.607360600413466,25.001089150097886,108.40080364883885],
[27.555945623538975,4.966876361715012,83.69793753832789],[12.607360600413466,25.001089150097886,108.40080364883885],[25.728188864695372,11.048090230558632,107.36670049954753],
[19.323814468920496,23.207721168200944,86.5997361520841],[-0.1270756077013729,33.447432788100066,88.22383709204128],[-6.412591804007641,27.25580060015068,110.37960662983338],
[19.323814468920496,23.207721168200944,86.5997361520841],[-6.412591804007641,27.25580060015068,110.37960662983338],[12.607360600413466,25.001089150097886,108.40080364883885],
[-0.1270756077013729,33.447432788100066,88.22383709204128],[-18.706770514744793,22.122622521332158,85.98580072271358],[-22.432021235314142,16.757220034910784,105.73360932793074],
[-0.1270756077013729,33.447432788100066,88.22383709204128],[-22.432021235314142,16.757220034910784,105.73360932793074],[-6.412591804007641,27.25580060015068,110.37960662983338],
[0,0,-111],[21.449244407331385,17.998053071223097,-115.33448118412322],[28,0,-113.29807126778162],
[0,0,-111],[4.862148974674051,27.574617084341824,-114.38710898759963],[21.449244407331385,17.998053071223097,-115.33448118412322],
[0,0,-111],[-14.63976195944456,25.356811524472093,-108.86023804055543],[4.862148974674051,27.574617084341824,-114.38710898759963],
[0,0,-111],[-26.311393382005434,9.576564013118729,-116.82011558374396],[-14.63976195944456,25.356811524472093,-108.86023804055543],
[0,0,-111],[-26.311393382005434,-9.576564013118723,-112.2748494113802],[-26.311393382005434,9.576564013118729,-116.82011558374396],
[0,0,-111],[-14.000000000000012,-24.248711305964274,-117.41365111449593],[-26.311393382005434,-9.576564013118723,-112.2748494113802],
[0,0,-111],[4.862148974674039,-27.574617084341828,-114.60568491477093],[-14.000000000000012,-24.248711305964274,-117.41365111449593],
[0,0,-111],[21.449244407331378,-17.998053071223108,-115.10959001370429],[4.862148974674039,-27.574617084341828,-114.60568491477093],
[0,0,-111],[28,0,-113.29807126778162],[21.449244407331378,-17.998053071223108,-115.10959001370429],
[0,0,111],[-22.432021235314142,16.757220034910784,105.73360932793074],[-27.955258626471,-1.5822500204198602,108.63080446877782],
[0,0,111],[-27.955258626471,-1.5822500204198602,108.63080446877782],[-20.39791981820982,-19.18136770644583,108.14049116006588],
[0,0,111],[-20.39791981820982,-19.18136770644583,108.14049116006588],[-3.2961676293812414,-27.805310265469423,107.93107872202285],
[0,0,111],[-3.2961676293812414,-27.805310265469423,107.93107872202285],[15.347898026057551,-23.41883912967803,107.66936242247387],
[0,0,111],[15.347898026057551,-23.41883912967803,107.66936242247387],[26.810511622217447,-8.07443289370487,104.22144809056266],
[0,0,111],[26.810511622217447,-8.07443289370487,104.22144809056266],[25.728188864695372,11.048090230558632,107.36670049954753],
[0,0,111],[25.728188864695372,11.048090230558632,107.36670049954753],[12.607360600413466,25.001089150097886,108.40080364883885],
[0,0,111],[12.607360600413466,25.001089150097886,108.40080364883885],[-6.412591804007641,27.25580060015068,110.37960662983338],
[0,0,111],[-6.412591804007641,27.25580060015068,110.37960662983338],[-22.432021235314142,16.757220034910784,105.73360932793074] ],
faces=[[0,1,2],[3,4,5],[6,7,8],
[9,10,11],[12,13,14],[15,16,17],
[18,19,20],[21,22,23],[24,25,26],
[27,28,29],[30,31,32],[33,34,35],
[36,37,38],[39,40,41],[42,43,44],
[45,46,47],[48,49,50],[51,52,53],
[54,55,56],[57,58,59],[60,61,62],
[63,64,65],[66,67,68],[69,70,71],
[72,73,74],[75,76,77],[78,79,80],
[81,82,83],[84,85,86],[87,88,89],
[90,91,92],[93,94,95],[96,97,98],
[99,100,101],[102,103,104],[105,106,107],
[108,109,110],[111,112,113],[114,115,116],
[117,118,119],[120,121,122],[123,124,125],
[126,127,128],[129,130,131],[132,133,134],
[135,136,137],[138,139,140],[141,142,143],
[144,145,146],[147,148,149],[150,151,152],
[153,154,155],[156,157,158],[159,160,161],
[162,163,164],[165,166,167],[168,169,170],
[171,172,173],[174,175,176],[177,178,179],
[180,181,182],[183,184,185],[186,187,188],
[189,190,191],[192,193,194],[195,196,197],
[198,199,200],[201,202,203],[204,205,206],
[207,208,209],[210,211,212],[213,214,215],
[216,217,218],[219,220,221],[222,223,224],
[225,226,227],[228,229,230],[231,232,233],
[234,235,236],[237,238,239],[240,241,242],
[243,244,245],[246,247,248],[249,250,251],
[252,253,254],[255,256,257],[258,259,260],
[261,262,263],[264,265,266],[267,268,269],
[270,271,272],[273,274,275],[276,277,278],
[279,280,281],[282,283,284],[285,286,287],
[288,289,290],[291,292,293],[294,295,296],
[297,298,299],[300,301,302],[303,304,305],
[306,307,308],[309,310,311],[312,313,314],
[315,316,317],[318,319,320],[321,322,323],
[324,325,326],[327,328,329],[330,331,332],
[333,334,335],[336,337,338],[339,340,341],
[342,343,344],[345,346,347],[348,349,350],
[351,352,353],[354,355,356],[357,358,359],
[360,361,362],[363,364,365],[366,367,368],
[369,370,371],[372,373,374],[375,376,377],
[378,379,380],[381,382,383],[384,385,386],
[387,388,389],[390,391,392],[393,394,395],
[396,397,398],[399,400,401],[402,403,404],
[405,406,407],[408,409,410],[411,412,413],
[414,415,416],[417,418,419],[420,421,422],
[423,424,425],[426,427,428],[429,430,431],
[432,433,434],[435,436,437],[438,439,440],
[441,442,443],[444,445,446],[447,448,449],
[450,451,452],[453,454,455],[456,457,458],
[459,460,461],[462,463,464],[465,466,467],
[468,469,470],[471,472,473],[474,475,476],
[477,478,479],[480,481,482],[483,484,485],
[486,487,488],[489,490,491],[492,493,494],
[495,496,497],[498,499,500],[501,502,503],
[504,505,506],[507,508,509],[510,511,512],
[513,514,515],[516,517,518],[519,520,521],
[522,523,524],[525,526,527],[528,529,530],
[531,532,533],[534,535,536],[537,538,539],
[540,541,542],[543,544,545],[546,547,548],
[549,550,551],[552,553,554],[555,556,557],
[558,559,560],[561,562,563],[564,565,566],
[567,568,569],[570,571,572],[573,574,575],
[576,577,578],[579,580,581],[582,583,584],
[585,586,587],[588,589,590],[591,592,593],
[594,595,596],[597,598,599],[600,601,602],
[603,604,605],[606,607,608],[609,610,611],
[612,613,614],[615,616,617],[618,619,620],
[621,622,623],[624,625,626],[627,628,629],
[630,631,632],[633,634,635],[636,637,638],
[639,640,641],[642,643,644],[645,646,647]]);}

function object1Min() = [-97.090, -88.453, -117.414];
function object1Max() = [74.131, 76.360, 111.000];

object1(0.5);
